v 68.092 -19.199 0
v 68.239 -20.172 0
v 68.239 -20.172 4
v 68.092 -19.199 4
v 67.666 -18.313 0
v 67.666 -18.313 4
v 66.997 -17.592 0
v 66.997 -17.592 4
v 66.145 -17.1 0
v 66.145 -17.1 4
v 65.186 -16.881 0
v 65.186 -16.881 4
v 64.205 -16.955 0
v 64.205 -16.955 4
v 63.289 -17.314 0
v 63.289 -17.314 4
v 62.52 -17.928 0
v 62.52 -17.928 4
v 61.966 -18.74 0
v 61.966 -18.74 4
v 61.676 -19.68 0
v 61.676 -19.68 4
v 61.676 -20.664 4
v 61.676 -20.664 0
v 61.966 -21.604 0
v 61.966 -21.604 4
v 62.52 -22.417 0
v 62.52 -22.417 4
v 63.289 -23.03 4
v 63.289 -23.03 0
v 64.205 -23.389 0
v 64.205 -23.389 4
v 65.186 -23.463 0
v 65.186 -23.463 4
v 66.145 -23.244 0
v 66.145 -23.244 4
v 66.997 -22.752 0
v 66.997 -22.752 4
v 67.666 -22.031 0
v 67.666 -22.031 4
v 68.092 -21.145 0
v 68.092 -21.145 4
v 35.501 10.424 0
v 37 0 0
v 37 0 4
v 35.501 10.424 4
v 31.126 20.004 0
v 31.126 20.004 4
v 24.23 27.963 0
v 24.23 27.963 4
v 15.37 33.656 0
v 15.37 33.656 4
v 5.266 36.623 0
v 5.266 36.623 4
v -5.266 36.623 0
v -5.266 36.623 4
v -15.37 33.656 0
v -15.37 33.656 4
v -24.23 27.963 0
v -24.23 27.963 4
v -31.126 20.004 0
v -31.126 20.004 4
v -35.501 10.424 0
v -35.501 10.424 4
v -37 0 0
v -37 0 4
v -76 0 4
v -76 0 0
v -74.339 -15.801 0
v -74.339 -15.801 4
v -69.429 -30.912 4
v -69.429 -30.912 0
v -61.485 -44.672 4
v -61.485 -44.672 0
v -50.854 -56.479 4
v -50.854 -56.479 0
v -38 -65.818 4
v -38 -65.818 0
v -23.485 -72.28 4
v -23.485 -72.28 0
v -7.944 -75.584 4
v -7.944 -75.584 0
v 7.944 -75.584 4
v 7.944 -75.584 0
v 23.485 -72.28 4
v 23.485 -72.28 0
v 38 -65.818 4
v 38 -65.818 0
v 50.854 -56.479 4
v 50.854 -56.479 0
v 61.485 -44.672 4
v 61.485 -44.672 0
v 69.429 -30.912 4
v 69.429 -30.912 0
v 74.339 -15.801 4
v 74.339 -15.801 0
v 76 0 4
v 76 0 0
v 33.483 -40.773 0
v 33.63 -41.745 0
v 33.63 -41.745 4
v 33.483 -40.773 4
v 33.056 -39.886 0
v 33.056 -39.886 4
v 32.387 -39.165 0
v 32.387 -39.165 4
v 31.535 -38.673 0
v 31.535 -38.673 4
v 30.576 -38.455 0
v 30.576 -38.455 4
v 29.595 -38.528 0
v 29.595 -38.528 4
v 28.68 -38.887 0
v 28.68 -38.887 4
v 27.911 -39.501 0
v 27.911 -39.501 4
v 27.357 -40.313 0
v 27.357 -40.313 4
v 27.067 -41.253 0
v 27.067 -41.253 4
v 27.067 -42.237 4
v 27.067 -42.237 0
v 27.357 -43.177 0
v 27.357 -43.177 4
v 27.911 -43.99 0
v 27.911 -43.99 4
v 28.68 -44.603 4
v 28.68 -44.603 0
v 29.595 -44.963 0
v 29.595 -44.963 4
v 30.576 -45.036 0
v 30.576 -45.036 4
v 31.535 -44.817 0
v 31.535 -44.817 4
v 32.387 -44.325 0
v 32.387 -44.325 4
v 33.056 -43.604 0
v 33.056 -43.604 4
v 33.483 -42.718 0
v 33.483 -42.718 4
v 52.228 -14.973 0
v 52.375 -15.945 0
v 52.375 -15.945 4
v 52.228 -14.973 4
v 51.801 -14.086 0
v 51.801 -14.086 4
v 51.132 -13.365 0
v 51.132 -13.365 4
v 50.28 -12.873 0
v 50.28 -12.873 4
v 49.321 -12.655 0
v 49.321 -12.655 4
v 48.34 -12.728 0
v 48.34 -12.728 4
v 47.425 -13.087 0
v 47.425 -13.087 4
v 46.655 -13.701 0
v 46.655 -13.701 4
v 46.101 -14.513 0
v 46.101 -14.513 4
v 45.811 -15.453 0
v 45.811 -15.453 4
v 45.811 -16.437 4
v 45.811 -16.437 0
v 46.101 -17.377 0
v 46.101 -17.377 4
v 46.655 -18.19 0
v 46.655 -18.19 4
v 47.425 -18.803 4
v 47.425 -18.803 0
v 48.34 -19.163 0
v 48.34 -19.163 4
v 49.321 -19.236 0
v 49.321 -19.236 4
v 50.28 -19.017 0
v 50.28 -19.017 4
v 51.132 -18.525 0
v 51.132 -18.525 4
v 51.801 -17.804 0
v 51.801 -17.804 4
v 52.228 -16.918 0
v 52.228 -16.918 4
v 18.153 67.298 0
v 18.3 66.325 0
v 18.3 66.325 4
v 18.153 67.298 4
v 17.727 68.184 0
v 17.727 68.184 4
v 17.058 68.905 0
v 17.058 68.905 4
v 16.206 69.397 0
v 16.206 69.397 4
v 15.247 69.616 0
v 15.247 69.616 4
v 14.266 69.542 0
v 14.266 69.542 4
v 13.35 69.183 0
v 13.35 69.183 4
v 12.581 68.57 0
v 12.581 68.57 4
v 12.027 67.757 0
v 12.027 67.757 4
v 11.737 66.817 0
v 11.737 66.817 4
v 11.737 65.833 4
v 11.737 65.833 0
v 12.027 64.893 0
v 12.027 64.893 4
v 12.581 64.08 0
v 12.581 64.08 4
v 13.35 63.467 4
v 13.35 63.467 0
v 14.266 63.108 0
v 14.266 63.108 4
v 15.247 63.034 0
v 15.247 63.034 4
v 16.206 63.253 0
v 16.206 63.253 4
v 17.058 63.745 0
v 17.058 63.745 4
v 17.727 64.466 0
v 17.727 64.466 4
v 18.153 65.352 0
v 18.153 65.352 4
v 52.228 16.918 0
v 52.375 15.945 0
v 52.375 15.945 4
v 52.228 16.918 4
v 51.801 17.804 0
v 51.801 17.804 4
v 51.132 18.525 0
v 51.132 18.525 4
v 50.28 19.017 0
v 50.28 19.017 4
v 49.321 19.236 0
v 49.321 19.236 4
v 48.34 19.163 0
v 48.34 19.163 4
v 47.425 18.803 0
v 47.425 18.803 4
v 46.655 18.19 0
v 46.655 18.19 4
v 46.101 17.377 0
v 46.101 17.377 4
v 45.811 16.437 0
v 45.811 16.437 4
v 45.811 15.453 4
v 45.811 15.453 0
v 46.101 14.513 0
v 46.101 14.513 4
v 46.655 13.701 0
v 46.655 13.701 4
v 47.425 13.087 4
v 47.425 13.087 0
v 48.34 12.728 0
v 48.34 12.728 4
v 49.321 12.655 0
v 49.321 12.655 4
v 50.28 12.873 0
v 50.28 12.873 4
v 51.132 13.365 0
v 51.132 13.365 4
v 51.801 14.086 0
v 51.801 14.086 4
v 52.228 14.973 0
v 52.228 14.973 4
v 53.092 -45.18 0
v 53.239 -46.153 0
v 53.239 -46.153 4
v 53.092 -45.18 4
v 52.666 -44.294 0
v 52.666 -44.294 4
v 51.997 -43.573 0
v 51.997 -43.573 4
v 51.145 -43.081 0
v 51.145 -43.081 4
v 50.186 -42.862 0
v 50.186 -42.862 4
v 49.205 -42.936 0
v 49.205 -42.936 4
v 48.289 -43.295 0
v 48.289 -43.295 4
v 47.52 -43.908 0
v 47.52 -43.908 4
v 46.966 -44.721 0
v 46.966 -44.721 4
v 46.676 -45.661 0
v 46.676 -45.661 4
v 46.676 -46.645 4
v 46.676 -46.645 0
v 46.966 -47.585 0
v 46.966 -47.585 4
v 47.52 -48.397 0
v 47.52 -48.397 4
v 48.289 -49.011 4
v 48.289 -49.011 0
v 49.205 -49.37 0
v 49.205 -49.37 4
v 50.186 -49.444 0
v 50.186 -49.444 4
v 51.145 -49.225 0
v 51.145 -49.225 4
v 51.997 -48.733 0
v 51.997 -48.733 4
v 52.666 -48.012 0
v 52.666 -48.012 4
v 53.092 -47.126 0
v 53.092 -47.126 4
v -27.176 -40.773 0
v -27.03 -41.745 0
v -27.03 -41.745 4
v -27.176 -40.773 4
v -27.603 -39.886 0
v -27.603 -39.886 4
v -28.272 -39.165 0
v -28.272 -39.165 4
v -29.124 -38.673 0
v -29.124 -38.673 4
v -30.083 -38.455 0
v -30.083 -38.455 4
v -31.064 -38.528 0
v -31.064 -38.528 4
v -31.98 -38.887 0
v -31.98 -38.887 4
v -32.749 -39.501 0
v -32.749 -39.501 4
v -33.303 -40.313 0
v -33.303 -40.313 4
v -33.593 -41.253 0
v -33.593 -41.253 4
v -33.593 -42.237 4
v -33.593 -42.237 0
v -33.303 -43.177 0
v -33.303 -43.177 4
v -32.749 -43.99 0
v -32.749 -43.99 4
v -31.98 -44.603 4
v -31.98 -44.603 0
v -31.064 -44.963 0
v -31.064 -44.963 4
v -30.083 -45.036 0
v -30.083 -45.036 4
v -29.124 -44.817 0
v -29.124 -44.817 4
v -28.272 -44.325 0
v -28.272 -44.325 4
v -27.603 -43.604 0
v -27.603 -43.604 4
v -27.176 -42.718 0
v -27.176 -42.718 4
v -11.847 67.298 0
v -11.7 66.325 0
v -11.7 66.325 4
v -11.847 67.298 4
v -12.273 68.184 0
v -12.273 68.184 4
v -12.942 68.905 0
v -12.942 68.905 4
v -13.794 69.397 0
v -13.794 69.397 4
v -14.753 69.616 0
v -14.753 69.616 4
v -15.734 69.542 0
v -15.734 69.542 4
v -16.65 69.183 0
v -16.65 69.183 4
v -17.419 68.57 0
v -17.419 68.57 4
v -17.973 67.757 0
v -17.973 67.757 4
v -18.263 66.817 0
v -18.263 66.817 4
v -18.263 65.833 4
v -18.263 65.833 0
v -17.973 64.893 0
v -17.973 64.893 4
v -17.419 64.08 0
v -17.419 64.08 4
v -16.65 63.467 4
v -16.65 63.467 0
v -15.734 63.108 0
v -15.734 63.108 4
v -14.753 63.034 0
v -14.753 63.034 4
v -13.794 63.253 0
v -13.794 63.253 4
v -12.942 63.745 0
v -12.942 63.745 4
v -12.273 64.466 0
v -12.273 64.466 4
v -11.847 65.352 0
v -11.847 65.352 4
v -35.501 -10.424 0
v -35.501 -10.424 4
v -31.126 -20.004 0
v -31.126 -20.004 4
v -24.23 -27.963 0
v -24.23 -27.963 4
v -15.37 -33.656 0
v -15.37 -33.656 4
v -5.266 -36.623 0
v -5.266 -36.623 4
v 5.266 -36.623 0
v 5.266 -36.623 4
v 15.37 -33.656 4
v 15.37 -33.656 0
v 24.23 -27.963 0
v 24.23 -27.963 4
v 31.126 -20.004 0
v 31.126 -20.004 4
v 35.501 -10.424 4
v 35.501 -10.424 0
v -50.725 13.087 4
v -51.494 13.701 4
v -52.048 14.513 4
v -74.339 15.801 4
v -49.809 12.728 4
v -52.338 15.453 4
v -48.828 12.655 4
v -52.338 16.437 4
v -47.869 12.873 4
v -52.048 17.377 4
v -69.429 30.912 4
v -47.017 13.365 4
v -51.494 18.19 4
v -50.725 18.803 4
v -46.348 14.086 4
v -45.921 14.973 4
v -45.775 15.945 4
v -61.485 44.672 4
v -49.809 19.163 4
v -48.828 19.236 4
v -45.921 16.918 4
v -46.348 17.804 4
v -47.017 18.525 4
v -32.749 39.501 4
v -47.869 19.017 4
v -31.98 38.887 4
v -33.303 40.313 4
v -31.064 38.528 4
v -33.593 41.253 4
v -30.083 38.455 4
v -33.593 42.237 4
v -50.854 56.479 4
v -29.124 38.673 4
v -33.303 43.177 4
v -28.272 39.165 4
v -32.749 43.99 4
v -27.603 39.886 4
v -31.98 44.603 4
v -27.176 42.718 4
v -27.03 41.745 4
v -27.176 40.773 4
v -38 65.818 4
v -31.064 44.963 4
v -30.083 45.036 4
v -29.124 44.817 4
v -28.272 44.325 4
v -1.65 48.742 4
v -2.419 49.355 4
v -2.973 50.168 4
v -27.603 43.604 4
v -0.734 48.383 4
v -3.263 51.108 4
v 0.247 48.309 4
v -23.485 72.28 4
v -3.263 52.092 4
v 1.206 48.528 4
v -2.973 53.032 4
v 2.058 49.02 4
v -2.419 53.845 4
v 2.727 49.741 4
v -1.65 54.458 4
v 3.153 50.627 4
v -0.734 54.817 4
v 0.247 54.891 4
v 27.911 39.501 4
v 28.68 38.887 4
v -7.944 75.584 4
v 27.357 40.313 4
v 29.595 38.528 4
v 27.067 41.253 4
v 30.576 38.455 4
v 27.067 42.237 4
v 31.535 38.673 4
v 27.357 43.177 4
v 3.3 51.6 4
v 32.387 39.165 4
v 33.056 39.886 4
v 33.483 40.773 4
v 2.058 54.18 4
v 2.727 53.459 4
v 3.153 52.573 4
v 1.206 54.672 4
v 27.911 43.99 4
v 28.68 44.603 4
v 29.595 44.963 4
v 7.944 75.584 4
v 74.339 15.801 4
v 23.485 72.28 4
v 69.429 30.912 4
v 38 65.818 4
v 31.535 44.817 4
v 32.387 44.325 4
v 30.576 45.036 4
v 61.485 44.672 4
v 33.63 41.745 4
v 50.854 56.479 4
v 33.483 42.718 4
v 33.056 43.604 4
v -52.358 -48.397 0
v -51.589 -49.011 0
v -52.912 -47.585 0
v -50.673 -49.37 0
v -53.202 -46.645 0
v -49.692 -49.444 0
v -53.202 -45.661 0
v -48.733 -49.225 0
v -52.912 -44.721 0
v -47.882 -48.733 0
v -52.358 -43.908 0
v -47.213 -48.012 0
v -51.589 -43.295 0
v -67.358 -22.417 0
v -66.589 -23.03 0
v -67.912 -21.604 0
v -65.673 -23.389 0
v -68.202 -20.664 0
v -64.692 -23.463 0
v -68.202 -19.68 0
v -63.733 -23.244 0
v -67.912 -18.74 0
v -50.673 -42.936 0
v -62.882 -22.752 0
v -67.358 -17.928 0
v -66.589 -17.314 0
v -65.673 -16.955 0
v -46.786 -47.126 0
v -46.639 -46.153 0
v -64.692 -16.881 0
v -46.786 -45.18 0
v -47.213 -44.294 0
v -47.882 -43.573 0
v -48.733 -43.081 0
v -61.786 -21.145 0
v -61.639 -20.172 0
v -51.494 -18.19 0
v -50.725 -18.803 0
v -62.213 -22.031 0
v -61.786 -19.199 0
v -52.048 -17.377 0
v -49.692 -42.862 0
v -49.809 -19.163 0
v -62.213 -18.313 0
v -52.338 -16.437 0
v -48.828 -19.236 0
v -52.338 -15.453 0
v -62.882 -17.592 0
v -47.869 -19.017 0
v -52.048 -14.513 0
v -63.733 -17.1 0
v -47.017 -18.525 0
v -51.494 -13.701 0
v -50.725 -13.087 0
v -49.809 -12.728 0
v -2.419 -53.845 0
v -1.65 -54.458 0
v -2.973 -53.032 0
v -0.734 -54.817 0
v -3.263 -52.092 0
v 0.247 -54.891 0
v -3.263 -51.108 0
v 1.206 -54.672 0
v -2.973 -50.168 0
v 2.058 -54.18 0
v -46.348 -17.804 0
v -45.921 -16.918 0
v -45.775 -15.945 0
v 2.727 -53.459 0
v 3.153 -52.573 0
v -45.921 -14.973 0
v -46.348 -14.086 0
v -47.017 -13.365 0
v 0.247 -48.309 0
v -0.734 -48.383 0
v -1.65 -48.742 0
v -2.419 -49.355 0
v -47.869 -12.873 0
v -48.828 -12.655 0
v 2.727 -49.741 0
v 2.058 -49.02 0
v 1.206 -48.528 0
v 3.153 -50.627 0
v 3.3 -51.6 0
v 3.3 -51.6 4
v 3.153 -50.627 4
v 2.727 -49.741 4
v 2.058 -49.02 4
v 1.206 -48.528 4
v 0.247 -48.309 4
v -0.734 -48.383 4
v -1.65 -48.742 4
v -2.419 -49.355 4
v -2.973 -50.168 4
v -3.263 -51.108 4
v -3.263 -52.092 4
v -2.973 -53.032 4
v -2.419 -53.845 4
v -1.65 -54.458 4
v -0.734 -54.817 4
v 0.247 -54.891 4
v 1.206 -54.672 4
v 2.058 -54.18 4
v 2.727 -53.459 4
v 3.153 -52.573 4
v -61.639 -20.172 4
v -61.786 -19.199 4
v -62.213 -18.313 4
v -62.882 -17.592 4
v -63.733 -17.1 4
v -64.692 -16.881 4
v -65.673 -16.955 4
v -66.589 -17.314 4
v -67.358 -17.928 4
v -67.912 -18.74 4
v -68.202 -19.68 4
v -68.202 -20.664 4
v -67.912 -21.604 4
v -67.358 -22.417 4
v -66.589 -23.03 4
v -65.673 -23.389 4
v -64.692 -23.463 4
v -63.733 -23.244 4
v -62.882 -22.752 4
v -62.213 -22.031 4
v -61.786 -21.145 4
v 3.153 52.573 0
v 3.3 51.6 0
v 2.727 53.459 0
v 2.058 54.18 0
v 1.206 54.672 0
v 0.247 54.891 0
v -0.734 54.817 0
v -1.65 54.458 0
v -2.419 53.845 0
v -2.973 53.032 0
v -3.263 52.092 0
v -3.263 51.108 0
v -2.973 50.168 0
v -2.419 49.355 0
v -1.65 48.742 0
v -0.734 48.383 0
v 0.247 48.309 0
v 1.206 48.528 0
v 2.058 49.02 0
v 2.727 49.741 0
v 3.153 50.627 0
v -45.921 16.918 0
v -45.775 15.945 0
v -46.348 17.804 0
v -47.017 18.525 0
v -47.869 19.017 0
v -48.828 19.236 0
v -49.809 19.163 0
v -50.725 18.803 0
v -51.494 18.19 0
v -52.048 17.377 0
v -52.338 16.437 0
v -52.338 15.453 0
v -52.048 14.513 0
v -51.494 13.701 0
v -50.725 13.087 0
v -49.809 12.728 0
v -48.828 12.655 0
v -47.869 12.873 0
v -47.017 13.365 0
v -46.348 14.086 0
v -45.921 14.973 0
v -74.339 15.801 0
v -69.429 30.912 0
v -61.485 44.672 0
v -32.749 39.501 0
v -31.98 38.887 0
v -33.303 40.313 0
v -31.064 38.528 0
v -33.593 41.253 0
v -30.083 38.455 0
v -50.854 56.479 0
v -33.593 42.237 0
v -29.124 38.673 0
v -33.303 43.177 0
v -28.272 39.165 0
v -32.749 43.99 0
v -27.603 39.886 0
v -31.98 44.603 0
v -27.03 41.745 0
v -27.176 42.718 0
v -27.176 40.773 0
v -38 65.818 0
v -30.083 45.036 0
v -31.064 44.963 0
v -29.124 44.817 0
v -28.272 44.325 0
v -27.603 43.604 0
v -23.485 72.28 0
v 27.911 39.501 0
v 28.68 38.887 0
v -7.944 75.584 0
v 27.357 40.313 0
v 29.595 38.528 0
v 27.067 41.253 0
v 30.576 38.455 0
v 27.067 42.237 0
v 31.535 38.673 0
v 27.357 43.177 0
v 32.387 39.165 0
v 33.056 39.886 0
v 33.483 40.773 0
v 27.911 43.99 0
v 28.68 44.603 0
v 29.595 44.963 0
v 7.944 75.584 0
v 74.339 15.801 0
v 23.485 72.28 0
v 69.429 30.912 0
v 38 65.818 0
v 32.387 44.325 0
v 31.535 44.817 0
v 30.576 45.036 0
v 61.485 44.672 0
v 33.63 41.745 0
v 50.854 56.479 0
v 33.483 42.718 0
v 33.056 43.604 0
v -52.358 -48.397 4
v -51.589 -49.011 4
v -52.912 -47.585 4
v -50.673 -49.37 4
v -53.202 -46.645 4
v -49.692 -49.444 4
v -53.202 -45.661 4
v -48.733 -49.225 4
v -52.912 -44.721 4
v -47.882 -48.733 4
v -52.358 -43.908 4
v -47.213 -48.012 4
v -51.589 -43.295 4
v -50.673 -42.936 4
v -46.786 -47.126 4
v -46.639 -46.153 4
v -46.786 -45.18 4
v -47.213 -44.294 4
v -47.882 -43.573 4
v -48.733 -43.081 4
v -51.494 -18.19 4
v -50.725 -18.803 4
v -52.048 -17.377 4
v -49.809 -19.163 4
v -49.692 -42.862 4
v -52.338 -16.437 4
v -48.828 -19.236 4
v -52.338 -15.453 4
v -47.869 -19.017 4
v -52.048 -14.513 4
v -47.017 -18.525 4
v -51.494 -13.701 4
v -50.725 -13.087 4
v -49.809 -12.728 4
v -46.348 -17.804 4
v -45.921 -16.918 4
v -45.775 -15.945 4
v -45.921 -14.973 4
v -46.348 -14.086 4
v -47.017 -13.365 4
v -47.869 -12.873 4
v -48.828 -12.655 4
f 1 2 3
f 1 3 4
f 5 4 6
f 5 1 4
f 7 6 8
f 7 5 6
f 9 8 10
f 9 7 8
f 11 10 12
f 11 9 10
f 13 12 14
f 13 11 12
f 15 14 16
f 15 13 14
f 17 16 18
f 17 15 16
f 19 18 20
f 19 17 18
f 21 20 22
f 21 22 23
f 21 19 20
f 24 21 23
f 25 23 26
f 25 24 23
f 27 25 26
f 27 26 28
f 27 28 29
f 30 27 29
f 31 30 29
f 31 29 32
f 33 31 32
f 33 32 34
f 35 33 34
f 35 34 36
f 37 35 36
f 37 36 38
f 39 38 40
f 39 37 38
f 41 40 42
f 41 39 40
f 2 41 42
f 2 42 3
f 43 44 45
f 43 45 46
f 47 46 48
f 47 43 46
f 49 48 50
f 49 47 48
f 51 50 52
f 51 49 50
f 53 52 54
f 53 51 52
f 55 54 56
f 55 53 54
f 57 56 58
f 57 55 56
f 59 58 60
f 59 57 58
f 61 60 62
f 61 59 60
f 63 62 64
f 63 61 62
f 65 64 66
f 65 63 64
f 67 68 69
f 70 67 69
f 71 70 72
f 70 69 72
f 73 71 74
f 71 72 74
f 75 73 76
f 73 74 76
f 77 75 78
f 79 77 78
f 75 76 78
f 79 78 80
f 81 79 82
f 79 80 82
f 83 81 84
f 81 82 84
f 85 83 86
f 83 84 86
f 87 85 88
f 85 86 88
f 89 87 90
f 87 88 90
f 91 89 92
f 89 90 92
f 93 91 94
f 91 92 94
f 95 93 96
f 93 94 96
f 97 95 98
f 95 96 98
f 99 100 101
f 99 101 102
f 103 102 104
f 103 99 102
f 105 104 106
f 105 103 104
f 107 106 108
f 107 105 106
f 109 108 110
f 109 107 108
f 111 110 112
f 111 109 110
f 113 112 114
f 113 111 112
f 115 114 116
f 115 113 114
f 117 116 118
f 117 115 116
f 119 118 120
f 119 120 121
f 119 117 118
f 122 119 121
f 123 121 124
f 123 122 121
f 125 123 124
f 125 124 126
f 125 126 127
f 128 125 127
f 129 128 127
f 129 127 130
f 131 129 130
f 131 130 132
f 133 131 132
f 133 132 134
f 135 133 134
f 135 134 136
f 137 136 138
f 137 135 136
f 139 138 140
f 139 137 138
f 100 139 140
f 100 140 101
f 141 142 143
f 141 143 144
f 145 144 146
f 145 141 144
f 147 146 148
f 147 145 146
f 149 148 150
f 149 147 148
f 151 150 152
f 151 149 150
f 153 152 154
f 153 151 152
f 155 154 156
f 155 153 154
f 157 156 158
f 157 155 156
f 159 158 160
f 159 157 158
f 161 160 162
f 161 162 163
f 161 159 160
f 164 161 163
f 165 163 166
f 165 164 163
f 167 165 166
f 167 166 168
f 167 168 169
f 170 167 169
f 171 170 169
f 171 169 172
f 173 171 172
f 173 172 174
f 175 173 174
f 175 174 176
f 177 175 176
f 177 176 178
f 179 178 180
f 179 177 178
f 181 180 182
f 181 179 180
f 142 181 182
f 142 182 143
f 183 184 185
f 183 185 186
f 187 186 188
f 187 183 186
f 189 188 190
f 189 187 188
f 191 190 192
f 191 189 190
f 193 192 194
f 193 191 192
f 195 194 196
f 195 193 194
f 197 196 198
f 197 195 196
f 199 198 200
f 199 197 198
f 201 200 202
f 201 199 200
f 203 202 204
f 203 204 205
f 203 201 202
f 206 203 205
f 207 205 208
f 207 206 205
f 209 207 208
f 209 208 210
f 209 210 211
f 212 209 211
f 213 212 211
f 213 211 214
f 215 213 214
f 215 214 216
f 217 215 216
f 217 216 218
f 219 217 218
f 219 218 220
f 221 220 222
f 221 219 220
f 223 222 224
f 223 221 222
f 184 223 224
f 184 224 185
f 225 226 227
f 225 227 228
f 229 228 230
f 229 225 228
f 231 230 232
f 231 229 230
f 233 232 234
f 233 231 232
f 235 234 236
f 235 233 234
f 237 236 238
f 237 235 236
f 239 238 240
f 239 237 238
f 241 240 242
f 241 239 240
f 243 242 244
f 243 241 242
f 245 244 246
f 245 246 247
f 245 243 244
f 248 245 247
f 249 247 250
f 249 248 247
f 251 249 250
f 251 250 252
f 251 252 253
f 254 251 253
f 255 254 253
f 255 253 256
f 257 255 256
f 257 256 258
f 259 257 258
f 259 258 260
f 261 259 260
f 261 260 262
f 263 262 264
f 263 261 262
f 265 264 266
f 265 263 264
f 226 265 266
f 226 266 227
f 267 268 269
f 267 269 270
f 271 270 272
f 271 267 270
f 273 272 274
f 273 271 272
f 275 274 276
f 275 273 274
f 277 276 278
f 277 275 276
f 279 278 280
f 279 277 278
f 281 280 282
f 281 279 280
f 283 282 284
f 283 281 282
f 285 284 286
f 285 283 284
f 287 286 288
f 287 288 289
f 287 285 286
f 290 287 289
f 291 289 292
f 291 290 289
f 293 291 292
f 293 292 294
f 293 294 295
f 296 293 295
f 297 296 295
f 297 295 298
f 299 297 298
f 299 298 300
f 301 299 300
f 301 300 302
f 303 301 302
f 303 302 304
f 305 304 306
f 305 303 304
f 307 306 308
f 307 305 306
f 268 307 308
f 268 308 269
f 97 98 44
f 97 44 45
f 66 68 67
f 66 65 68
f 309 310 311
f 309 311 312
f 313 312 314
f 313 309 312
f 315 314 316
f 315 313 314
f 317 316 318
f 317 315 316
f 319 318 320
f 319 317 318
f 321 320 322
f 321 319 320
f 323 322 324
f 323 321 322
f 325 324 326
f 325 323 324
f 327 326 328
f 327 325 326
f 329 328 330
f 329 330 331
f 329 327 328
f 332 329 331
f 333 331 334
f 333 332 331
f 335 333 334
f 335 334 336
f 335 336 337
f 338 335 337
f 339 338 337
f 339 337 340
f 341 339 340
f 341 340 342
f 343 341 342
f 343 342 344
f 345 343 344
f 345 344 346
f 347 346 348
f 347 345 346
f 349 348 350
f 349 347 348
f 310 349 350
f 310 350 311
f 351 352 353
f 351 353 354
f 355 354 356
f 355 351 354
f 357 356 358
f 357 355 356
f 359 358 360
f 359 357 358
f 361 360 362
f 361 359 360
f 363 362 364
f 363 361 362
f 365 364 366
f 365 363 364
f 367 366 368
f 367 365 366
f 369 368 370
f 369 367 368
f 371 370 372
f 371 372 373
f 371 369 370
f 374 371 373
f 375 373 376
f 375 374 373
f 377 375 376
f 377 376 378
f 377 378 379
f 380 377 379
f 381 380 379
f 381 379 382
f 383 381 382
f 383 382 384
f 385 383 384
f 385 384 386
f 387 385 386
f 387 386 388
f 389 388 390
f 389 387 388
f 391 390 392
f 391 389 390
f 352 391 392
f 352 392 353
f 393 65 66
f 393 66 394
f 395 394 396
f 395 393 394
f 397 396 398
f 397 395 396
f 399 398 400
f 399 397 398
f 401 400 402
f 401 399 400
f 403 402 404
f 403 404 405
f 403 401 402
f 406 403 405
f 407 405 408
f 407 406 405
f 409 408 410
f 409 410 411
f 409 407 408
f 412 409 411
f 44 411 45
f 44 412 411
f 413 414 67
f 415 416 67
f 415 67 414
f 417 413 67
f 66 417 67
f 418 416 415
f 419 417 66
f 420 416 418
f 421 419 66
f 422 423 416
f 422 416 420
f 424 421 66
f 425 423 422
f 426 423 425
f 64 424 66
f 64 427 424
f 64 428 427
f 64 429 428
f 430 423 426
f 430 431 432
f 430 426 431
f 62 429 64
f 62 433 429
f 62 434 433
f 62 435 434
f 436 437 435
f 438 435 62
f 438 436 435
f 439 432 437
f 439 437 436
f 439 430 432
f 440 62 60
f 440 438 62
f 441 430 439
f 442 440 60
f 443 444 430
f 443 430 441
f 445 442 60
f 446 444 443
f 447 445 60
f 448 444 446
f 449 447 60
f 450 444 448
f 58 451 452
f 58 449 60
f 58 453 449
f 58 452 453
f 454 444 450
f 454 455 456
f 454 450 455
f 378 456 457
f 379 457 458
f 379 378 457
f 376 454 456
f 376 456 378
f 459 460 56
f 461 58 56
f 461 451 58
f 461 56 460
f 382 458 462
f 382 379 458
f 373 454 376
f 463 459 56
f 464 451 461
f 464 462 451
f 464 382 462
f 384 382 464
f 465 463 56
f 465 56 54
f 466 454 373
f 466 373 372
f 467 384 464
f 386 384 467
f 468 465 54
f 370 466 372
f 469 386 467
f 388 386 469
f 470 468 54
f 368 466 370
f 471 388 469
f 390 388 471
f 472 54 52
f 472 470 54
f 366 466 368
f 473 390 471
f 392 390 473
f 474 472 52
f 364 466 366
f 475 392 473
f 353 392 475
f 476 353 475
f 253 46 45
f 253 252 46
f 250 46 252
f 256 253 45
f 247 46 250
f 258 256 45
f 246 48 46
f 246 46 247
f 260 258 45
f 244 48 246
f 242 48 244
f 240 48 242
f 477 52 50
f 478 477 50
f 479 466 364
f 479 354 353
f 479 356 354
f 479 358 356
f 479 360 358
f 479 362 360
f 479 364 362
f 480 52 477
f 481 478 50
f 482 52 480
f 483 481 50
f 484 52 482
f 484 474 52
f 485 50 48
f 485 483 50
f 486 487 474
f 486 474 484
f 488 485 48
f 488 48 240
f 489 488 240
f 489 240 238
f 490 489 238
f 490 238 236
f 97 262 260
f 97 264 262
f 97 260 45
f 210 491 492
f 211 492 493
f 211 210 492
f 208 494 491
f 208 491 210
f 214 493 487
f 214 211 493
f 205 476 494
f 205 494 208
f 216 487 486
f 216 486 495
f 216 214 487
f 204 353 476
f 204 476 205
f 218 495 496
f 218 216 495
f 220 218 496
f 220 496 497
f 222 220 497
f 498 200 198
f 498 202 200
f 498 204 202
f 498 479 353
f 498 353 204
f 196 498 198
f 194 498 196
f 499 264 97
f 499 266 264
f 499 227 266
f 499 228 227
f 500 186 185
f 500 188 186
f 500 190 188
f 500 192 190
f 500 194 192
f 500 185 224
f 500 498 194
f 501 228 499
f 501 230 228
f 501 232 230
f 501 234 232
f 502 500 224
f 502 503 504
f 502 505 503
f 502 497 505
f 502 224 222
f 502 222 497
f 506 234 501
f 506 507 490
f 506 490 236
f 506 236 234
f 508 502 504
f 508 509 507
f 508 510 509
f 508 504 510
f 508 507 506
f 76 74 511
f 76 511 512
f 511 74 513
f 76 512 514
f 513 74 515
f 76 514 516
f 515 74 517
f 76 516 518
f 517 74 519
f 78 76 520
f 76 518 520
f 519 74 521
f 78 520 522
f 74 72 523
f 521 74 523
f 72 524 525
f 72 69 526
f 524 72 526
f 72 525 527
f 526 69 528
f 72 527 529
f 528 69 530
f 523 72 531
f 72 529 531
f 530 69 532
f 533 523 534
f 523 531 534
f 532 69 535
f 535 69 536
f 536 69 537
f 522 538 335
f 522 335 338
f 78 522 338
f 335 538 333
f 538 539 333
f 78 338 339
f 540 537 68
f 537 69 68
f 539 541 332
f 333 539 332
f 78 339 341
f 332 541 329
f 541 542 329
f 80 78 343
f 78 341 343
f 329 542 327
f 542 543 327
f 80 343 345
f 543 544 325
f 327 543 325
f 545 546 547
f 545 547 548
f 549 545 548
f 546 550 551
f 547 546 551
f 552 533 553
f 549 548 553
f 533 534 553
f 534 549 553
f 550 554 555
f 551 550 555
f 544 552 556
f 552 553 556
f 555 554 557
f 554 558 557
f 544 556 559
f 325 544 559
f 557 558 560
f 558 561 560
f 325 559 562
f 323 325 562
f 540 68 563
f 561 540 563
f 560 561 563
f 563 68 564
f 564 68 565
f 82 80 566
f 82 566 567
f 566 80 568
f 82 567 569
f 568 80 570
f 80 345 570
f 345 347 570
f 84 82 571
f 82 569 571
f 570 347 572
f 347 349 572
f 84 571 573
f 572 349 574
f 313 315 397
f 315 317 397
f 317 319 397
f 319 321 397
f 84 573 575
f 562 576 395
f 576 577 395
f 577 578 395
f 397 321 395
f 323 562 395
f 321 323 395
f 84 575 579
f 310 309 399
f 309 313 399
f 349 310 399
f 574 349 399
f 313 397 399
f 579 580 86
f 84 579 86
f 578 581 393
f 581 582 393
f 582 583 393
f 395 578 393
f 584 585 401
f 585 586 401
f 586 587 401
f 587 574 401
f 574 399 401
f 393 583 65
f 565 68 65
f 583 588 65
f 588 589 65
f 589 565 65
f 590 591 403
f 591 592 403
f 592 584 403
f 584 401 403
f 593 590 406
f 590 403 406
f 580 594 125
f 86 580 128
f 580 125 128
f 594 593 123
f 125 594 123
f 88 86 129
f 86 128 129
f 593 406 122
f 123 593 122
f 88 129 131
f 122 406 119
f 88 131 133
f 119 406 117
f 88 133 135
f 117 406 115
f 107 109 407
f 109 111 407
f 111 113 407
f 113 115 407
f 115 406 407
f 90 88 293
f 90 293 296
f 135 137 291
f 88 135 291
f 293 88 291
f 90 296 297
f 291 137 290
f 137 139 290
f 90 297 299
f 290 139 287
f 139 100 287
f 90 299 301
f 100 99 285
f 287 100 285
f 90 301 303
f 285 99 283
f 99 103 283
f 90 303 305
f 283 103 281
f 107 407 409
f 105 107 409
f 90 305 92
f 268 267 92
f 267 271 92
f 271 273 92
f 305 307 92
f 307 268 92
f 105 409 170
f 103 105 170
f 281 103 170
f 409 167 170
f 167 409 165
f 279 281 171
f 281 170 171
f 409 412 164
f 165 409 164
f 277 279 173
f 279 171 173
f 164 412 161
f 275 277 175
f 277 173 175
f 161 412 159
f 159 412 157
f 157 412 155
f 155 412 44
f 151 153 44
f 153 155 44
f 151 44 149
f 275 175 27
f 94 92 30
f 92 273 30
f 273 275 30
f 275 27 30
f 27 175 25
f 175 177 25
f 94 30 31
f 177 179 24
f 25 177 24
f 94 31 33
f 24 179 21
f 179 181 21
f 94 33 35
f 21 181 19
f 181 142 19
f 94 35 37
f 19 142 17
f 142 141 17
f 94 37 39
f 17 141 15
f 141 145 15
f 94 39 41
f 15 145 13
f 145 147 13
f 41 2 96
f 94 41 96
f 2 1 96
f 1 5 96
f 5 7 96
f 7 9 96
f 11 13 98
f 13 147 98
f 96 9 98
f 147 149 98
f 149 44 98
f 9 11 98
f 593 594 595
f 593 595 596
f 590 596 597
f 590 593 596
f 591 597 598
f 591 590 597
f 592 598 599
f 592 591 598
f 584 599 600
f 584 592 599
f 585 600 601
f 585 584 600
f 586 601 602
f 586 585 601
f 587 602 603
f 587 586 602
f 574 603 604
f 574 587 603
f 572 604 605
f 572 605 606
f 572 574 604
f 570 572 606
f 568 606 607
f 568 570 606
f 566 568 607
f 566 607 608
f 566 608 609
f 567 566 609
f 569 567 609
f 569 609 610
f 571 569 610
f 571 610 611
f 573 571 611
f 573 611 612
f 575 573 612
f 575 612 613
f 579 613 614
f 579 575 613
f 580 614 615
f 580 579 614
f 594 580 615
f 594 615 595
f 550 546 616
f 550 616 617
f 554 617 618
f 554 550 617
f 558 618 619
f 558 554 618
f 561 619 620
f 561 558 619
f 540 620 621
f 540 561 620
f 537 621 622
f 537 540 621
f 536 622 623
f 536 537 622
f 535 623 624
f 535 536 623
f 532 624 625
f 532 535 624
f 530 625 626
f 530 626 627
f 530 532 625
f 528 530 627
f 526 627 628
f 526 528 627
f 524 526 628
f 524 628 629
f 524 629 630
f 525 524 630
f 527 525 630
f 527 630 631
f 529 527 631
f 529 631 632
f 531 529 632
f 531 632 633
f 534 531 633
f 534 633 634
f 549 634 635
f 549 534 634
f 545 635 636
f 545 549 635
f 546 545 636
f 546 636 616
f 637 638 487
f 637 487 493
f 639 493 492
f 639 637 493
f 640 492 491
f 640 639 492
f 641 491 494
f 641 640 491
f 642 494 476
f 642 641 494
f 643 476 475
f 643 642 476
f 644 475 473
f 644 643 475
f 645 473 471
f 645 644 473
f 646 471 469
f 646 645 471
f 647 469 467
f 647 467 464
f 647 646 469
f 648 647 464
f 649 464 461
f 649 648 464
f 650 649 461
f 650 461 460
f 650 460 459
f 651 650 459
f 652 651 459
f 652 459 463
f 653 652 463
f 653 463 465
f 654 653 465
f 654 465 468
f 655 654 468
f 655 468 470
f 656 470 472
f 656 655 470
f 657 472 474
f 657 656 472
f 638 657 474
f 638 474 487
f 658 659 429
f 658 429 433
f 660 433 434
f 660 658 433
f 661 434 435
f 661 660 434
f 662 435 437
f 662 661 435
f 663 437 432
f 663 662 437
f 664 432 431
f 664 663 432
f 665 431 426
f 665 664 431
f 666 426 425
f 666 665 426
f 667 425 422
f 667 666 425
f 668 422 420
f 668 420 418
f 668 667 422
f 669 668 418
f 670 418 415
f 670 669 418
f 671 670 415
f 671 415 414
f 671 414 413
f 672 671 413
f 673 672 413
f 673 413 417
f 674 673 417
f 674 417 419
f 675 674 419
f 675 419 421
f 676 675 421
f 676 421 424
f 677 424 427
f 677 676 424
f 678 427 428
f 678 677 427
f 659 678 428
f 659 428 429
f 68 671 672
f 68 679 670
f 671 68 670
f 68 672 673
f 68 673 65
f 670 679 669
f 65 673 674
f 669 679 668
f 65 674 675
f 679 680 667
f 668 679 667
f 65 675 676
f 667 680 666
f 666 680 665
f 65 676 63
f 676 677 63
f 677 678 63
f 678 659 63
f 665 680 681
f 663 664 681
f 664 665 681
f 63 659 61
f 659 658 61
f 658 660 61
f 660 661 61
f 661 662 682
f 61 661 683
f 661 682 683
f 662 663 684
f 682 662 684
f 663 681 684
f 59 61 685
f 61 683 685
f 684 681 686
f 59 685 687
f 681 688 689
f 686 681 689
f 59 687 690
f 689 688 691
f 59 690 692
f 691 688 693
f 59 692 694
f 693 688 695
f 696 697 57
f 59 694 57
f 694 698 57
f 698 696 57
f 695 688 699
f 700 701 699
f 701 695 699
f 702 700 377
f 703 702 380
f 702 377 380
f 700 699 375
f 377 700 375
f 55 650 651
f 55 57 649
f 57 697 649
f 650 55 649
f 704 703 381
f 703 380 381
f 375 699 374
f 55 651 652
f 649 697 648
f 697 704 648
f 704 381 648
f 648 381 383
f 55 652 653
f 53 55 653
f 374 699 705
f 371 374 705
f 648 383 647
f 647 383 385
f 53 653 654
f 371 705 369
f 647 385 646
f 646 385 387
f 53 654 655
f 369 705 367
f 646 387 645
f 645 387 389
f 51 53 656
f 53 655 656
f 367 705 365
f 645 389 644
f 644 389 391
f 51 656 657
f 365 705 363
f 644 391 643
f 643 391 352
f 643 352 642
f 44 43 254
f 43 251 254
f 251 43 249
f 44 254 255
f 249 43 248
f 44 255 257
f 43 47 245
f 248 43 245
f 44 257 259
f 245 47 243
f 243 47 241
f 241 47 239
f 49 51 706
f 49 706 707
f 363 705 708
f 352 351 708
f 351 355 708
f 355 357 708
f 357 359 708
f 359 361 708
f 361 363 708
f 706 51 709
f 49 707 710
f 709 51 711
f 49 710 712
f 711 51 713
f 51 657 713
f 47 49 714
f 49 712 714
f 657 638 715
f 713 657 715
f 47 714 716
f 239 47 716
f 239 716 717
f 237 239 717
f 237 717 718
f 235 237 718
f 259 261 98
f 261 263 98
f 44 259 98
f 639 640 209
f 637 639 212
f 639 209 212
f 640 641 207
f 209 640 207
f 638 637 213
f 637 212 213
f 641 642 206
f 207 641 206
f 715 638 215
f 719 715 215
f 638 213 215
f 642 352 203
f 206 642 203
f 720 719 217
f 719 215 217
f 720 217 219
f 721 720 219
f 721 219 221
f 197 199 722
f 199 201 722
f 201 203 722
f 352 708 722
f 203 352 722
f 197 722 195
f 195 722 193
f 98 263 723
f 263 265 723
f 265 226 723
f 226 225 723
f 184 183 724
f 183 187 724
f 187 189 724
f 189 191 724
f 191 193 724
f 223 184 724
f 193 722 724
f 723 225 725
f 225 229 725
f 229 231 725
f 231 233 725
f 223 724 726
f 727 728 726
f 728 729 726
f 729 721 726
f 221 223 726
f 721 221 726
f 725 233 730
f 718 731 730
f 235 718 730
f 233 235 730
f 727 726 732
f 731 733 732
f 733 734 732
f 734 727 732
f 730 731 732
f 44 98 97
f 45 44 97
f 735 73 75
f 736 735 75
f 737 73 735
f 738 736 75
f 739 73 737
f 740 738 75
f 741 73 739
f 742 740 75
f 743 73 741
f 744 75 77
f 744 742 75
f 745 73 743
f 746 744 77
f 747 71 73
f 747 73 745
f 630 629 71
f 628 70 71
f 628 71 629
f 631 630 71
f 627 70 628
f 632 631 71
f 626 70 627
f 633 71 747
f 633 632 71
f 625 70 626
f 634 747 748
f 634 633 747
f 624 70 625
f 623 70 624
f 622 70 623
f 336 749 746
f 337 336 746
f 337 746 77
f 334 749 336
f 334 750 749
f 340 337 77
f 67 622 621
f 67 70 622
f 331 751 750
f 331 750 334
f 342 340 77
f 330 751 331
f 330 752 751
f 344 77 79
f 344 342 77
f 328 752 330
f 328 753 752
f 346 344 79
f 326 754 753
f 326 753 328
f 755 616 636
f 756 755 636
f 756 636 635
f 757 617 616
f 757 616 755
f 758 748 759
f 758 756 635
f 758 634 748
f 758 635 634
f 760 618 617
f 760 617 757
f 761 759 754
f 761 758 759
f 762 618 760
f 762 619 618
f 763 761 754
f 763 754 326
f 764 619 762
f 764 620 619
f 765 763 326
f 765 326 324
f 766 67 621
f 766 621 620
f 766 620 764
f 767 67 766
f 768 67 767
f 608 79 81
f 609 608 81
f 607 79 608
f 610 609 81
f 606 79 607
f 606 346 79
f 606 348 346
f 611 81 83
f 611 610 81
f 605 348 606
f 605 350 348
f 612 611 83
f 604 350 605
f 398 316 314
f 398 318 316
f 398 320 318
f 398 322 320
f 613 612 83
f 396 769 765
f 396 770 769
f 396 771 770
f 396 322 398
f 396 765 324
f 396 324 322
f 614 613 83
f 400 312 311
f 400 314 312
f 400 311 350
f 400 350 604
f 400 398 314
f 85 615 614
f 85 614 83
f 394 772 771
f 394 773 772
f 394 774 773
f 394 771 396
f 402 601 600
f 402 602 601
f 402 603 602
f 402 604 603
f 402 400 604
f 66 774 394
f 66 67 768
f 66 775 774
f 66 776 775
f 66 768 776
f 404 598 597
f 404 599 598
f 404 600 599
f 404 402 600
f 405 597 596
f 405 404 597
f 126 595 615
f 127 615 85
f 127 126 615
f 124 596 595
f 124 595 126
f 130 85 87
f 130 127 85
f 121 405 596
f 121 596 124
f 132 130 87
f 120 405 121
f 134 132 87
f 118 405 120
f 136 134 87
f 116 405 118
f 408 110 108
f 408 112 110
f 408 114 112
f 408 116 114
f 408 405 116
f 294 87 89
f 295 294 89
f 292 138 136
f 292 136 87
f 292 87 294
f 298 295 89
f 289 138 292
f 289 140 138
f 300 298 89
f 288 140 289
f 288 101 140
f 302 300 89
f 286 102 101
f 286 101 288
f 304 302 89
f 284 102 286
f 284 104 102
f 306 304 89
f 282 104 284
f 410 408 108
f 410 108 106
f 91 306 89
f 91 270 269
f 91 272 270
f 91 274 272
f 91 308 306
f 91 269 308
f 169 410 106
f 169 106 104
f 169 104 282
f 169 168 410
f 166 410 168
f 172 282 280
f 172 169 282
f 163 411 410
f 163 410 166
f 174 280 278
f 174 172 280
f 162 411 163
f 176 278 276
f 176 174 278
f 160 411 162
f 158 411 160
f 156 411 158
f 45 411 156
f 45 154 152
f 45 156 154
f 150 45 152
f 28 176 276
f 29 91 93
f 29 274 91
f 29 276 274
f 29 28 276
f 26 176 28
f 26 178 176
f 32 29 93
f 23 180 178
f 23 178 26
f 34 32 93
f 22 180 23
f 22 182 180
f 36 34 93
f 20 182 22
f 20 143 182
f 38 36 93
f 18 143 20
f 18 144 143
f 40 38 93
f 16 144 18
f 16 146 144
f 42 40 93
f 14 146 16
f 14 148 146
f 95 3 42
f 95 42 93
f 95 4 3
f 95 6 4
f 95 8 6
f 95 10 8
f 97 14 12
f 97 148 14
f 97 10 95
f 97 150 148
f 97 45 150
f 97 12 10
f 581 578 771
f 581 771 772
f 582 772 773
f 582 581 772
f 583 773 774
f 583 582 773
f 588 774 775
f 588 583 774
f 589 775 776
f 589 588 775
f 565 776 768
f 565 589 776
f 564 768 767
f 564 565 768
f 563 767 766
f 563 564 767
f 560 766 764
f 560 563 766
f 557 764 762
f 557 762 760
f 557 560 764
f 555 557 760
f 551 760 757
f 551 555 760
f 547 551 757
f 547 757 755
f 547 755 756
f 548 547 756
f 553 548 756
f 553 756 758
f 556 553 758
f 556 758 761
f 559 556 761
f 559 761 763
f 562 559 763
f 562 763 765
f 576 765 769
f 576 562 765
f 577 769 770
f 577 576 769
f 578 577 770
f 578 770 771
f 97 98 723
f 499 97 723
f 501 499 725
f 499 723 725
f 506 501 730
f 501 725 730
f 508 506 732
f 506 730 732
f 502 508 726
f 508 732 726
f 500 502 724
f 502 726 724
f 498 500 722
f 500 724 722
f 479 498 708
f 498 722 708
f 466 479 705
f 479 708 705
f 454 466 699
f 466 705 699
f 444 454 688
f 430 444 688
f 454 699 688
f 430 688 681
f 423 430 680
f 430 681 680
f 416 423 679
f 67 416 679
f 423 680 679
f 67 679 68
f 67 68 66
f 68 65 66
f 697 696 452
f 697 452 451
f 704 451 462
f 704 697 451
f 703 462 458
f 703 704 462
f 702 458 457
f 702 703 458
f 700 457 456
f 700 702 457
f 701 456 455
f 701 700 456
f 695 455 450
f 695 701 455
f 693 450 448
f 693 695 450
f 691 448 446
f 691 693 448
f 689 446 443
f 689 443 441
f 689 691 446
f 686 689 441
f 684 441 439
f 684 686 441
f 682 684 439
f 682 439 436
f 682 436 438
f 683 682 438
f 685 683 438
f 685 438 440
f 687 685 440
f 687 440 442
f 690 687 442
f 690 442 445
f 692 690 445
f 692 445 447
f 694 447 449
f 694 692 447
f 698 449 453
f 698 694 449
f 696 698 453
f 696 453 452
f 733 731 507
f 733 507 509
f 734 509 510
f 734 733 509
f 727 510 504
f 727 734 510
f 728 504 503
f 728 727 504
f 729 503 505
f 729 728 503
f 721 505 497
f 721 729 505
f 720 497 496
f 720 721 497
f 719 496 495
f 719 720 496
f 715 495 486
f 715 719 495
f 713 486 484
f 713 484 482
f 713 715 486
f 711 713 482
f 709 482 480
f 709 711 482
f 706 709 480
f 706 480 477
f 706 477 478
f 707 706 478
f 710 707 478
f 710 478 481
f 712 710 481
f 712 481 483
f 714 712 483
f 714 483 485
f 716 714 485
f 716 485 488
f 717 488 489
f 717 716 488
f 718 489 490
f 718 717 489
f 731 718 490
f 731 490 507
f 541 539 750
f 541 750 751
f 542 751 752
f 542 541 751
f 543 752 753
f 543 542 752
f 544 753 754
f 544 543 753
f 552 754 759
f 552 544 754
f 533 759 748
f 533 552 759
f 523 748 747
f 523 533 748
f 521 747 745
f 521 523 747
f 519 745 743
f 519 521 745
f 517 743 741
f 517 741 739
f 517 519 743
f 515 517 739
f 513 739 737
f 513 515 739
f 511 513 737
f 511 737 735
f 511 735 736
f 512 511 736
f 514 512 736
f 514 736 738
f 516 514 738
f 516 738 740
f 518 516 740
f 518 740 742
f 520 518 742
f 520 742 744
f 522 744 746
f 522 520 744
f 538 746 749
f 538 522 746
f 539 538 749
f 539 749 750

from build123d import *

# Parameters (mm, degrees)
SKETCH1_R           = 76
SKETCH1_R_2         = 37
SKETCH1_R_3         = 3.3
BOSS_EXTRUDE1_DEPTH = 4


with BuildPart() as part:
    # Sketch1 → Boss-Extrude1 (new body)
    with BuildSketch(Plane.XY):
        Circle(SKETCH1_R)
        Circle(SKETCH1_R_2, mode=Mode.SUBTRACT)
        with Locations((0, 51.6)):
            Circle(SKETCH1_R_3, mode=Mode.SUBTRACT)
        with Locations((30.329719018, 41.74527691)):
            Circle(SKETCH1_R_3, mode=Mode.SUBTRACT)
        with Locations((49.074516241, 15.94527691)):
            Circle(SKETCH1_R_3, mode=Mode.SUBTRACT)
        with Locations((49.074516241, -15.94527691)):
            Circle(SKETCH1_R_3, mode=Mode.SUBTRACT)
        with Locations((30.329719018, -41.74527691)):
            Circle(SKETCH1_R_3, mode=Mode.SUBTRACT)
        with Locations((0, -51.6)):
            Circle(SKETCH1_R_3, mode=Mode.SUBTRACT)
        with Locations((-30.329719018, -41.74527691)):
            Circle(SKETCH1_R_3, mode=Mode.SUBTRACT)
        with Locations((-49.074516241, -15.94527691)):
            Circle(SKETCH1_R_3, mode=Mode.SUBTRACT)
        with Locations((-49.074516241, 15.94527691)):
            Circle(SKETCH1_R_3, mode=Mode.SUBTRACT)
        with Locations((-30.329719018, 41.74527691)):
            Circle(SKETCH1_R_3, mode=Mode.SUBTRACT)
        with Locations((-15, 66.324957595)):
            Circle(SKETCH1_R_3, mode=Mode.SUBTRACT)
        with Locations((15, 66.324957595)):
            Circle(SKETCH1_R_3, mode=Mode.SUBTRACT)
        with Locations((64.939098182, -20.172097741)):
            Circle(SKETCH1_R_3, mode=Mode.SUBTRACT)
        with Locations((49.939098182, -46.152859854)):
            Circle(SKETCH1_R_3, mode=Mode.SUBTRACT)
        with Locations((-49.939098182, -46.152859854)):
            Circle(SKETCH1_R_3, mode=Mode.SUBTRACT)
        with Locations((-64.939098182, -20.172097741)):
            Circle(SKETCH1_R_3, mode=Mode.SUBTRACT)
    extrude(amount=BOSS_EXTRUDE1_DEPTH)


with BuildPart() as body_2:
    # Split1: the piece on the far side of the plane
    add(part.part)
    split(bisect_by=Plane.ZX, keep=Keep.BOTTOM)


with BuildPart() as part_1:
    add(part.part)

    # Split1
    split(bisect_by=Plane.ZX, keep=Keep.TOP)


solid = Compound([body_2.part, part_1.part])
